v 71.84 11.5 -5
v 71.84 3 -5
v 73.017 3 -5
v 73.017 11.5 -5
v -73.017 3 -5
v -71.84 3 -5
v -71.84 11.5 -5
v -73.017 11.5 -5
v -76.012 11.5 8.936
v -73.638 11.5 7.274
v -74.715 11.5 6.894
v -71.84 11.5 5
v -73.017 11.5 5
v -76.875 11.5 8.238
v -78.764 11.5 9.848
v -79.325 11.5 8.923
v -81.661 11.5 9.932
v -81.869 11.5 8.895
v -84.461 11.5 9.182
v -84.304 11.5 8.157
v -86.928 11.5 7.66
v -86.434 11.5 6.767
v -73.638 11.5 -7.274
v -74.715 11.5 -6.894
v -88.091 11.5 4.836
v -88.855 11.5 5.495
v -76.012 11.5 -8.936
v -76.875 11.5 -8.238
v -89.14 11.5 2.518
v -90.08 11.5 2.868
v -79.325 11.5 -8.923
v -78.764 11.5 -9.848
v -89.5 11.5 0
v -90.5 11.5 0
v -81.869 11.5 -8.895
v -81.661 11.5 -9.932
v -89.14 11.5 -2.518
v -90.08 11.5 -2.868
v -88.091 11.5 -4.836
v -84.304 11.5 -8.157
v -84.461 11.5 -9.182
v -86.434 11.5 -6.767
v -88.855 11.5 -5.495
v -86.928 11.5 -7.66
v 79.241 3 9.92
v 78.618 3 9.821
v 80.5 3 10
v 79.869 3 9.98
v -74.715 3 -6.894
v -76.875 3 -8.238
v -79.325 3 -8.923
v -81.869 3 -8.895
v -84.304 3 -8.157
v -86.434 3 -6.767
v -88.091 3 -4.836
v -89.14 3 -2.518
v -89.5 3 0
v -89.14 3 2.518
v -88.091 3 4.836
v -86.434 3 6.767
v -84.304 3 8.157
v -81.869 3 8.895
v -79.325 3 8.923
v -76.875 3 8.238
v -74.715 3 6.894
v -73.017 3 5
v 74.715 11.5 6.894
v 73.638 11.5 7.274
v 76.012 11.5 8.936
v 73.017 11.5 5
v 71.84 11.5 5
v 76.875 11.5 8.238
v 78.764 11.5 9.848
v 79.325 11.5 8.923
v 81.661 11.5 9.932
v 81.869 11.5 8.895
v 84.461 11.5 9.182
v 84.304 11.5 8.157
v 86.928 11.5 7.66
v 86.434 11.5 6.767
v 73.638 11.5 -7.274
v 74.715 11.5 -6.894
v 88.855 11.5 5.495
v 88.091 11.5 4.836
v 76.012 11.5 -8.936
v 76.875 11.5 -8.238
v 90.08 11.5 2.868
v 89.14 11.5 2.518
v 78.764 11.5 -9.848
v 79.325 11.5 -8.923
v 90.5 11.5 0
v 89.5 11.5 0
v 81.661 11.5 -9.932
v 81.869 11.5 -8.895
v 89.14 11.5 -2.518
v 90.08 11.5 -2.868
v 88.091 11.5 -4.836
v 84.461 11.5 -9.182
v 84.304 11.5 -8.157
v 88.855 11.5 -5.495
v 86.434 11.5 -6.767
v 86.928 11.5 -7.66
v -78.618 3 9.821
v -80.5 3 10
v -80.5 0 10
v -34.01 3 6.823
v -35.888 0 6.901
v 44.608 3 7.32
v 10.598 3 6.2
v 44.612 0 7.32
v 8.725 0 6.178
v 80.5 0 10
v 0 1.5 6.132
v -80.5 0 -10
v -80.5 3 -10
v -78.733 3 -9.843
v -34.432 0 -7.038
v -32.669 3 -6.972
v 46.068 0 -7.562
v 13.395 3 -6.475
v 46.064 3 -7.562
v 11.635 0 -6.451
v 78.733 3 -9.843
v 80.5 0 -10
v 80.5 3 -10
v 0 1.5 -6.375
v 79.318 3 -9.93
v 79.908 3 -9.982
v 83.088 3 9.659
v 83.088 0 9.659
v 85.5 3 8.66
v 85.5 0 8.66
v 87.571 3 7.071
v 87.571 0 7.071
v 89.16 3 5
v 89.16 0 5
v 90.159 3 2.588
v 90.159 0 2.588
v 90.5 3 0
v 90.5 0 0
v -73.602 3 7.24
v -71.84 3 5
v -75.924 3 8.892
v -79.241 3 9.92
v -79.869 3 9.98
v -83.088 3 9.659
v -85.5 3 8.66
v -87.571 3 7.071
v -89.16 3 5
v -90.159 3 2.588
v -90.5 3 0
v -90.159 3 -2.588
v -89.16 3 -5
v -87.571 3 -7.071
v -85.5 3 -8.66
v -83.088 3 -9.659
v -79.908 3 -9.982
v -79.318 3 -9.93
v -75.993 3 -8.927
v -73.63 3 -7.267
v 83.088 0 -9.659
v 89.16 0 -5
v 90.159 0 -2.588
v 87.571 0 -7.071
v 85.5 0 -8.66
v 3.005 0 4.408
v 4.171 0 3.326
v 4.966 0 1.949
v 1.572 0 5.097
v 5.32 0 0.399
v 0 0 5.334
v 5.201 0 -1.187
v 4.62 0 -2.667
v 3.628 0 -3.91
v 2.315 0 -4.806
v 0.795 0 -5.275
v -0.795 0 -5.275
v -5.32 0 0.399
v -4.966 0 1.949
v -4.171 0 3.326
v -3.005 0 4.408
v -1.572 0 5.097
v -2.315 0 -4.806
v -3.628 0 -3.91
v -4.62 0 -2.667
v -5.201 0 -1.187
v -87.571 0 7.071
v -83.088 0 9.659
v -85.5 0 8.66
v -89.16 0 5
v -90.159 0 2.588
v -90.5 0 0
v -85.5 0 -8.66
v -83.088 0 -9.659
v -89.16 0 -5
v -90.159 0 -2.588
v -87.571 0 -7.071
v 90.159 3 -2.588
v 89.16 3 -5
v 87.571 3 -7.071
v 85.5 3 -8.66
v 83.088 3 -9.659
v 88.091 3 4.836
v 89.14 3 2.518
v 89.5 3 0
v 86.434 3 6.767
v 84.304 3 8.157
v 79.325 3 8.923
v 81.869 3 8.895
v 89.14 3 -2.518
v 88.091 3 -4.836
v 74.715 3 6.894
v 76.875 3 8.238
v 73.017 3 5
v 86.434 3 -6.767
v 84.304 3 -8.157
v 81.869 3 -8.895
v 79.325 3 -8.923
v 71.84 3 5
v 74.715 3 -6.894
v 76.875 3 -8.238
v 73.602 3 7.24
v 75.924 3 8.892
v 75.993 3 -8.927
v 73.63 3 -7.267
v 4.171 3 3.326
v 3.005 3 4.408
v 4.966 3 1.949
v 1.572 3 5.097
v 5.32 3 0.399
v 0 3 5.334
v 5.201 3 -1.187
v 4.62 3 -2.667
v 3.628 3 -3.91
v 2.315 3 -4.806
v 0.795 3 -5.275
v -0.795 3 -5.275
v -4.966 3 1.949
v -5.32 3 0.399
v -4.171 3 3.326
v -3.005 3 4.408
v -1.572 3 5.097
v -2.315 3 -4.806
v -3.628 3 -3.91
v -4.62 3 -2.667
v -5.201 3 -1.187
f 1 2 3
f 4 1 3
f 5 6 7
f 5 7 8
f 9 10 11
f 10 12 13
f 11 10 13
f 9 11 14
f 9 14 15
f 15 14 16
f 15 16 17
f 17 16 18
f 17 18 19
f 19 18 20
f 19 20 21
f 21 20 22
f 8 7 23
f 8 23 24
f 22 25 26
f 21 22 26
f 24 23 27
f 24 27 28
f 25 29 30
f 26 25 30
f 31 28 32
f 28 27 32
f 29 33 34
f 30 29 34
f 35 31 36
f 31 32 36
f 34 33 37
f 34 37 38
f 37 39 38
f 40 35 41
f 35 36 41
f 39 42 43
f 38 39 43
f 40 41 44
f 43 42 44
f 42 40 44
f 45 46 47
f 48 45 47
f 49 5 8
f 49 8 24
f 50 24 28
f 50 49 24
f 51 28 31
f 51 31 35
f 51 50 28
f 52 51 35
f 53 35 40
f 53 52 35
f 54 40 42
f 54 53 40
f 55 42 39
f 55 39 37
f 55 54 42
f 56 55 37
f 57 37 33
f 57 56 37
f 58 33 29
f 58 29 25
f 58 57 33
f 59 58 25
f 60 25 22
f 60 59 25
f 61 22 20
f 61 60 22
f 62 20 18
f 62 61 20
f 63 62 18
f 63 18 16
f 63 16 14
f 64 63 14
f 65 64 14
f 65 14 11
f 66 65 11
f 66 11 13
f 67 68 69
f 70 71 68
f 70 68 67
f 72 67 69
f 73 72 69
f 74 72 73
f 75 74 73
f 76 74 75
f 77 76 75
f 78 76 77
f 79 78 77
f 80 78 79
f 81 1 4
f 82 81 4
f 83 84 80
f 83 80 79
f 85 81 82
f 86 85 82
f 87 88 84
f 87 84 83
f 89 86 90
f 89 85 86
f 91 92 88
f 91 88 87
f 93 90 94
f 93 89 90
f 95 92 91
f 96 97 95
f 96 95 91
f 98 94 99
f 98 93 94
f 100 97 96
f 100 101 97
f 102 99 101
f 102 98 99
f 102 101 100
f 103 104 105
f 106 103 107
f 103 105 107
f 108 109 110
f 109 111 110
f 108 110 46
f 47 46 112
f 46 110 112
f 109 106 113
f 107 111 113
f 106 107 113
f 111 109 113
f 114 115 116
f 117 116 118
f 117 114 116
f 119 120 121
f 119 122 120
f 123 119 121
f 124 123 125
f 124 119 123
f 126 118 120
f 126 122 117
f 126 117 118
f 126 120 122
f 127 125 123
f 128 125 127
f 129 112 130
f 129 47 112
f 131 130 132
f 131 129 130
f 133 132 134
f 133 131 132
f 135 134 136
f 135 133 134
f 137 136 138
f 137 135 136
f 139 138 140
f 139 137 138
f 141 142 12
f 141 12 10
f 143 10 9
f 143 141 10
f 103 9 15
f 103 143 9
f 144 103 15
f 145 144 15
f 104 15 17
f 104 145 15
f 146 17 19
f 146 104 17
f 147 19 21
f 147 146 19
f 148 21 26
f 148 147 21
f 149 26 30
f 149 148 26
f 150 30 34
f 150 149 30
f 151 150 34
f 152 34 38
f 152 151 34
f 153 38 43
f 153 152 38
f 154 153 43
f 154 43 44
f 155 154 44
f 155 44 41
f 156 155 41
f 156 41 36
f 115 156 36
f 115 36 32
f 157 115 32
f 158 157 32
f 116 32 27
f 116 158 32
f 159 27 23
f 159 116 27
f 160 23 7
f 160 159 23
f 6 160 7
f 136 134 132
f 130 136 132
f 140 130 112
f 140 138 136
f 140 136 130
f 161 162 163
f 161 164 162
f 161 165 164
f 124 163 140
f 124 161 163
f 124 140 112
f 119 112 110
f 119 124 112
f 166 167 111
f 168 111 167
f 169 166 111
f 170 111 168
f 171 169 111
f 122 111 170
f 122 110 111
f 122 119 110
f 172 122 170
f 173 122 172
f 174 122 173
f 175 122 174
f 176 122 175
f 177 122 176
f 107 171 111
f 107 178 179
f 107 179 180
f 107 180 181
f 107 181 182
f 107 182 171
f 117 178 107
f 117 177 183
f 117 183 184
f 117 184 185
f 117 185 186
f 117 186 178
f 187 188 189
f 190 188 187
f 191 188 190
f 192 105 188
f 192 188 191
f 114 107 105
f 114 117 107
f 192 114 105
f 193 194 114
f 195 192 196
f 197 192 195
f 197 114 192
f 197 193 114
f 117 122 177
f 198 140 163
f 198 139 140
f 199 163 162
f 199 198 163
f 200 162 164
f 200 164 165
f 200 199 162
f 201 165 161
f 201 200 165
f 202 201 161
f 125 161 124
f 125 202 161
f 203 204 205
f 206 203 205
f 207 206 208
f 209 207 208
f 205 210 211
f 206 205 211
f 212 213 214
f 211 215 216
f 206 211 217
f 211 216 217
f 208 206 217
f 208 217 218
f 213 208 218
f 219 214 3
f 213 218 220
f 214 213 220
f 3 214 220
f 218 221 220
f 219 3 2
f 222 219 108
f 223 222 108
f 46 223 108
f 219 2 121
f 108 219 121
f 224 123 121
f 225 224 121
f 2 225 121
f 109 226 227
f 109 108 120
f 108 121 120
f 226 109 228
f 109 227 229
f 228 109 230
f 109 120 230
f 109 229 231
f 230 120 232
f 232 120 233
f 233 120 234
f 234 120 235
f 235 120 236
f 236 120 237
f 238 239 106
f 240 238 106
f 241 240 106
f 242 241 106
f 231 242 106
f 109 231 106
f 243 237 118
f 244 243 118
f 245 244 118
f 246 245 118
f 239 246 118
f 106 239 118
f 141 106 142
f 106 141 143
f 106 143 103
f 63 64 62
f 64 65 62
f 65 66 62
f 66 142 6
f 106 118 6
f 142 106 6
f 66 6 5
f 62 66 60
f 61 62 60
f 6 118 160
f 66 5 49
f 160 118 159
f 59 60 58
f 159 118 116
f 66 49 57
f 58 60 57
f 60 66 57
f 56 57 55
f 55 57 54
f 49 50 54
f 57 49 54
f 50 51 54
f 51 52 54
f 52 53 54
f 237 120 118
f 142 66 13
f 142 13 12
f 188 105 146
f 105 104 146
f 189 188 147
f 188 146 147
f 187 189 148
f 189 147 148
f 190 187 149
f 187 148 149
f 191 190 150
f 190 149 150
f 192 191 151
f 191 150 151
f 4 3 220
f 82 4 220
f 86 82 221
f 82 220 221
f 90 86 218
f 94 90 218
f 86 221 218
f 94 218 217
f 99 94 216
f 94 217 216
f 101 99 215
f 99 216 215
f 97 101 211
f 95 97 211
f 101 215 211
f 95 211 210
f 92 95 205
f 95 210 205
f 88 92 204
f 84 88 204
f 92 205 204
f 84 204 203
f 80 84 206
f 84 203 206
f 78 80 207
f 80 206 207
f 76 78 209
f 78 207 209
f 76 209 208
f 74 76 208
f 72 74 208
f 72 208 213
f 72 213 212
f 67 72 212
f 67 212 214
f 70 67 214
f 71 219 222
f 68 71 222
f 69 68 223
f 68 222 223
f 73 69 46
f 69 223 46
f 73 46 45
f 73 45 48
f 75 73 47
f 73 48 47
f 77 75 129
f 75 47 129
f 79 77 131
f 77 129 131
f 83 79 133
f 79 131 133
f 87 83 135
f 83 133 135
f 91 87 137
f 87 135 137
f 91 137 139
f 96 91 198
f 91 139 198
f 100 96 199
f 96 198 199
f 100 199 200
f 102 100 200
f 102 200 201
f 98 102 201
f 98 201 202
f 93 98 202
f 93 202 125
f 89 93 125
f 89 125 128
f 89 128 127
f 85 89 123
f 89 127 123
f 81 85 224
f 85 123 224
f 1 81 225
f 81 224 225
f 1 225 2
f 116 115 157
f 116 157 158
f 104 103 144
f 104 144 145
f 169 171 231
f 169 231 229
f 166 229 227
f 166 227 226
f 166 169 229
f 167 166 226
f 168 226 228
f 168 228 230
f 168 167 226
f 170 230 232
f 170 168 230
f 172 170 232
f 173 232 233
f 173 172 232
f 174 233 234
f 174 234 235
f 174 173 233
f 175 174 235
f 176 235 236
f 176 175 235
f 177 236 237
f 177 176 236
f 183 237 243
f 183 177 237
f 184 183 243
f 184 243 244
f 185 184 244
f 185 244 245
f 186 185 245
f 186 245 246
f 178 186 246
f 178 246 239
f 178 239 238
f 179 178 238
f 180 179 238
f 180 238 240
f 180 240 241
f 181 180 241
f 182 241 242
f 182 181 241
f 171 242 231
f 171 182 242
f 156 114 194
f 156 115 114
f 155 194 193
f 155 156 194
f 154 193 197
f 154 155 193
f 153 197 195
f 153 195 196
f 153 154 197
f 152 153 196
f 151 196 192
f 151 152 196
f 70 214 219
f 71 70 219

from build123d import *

# Parameters (mm, degrees)
SKETCH1_R           = 5.334493613
BOSS_EXTRUDE1_DEPTH = 3
BOSS_EXTRUDE3_DEPTH = 8.5
FILLET1_R           = 10


with BuildPart() as part:
    # Sketch1 → Boss-Extrude1 (new body)
    with BuildSketch(Plane(origin=(0, 0, 0), x_dir=(1, 0, 0), z_dir=(0, 1, 0))):
        with BuildLine():
            Line((-90.5, -10), (-90.5, 10))
            Line((-90.5, 10), (-80.5, 10))
            add(Edge.make_bspline(
                [(-80.5, 10), (0, 2.75), (80.5, 10)],
                knots=[0, 0, 0, 1, 1, 1], degree=2))
            Line((80.5, 10), (90.5, 10))
            Line((90.5, 10), (90.5, -10))
            Line((90.5, -10), (80.5, -10))
            add(Edge.make_bspline(
                [(-80.5, -10), (0, -2.264995309), (80.5, -10)],
                knots=[0, 0, 0, 1, 1, 1], degree=2))
            Line((-80.5, -10), (-90.5, -10))
        make_face()
        with Locations(Location((0, 0, 0), (0, 0, 270))):
            Circle(SKETCH1_R, mode=Mode.SUBTRACT)
    extrude(amount=BOSS_EXTRUDE1_DEPTH)

    # Sketch3 → Boss-Extrude3 (add)
    with BuildSketch(Plane(origin=(0, 3, 0), x_dir=(1, 0, 0), z_dir=(0, 1, 0))):
        with BuildLine():
            Line((71.839745962, 5), (73.016685226, 5))
            ThreePointArc((73.016685226, 5), (89.5, 0), (73.016685226, -5))
            Line((73.016685226, -5), (71.839745962, -5))
            ThreePointArc((71.839745962, -5), (90.5, 0), (71.839745962, 5))
        make_face()
        with BuildLine():
            Line((-73.016685226, -5), (-71.839745962, -5))
            ThreePointArc((-71.839745962, -5), (-90.5, 0), (-71.839745962, 5))
            Line((-71.839745962, 5), (-73.016685226, 5))
            ThreePointArc((-73.016685226, 5), (-89.5, 0), (-73.016685226, -5))
        make_face()
    extrude(amount=BOSS_EXTRUDE3_DEPTH)

    # Fillet1
    fillet1_edges = [part.edges().sort_by_distance(p)[0] for p in [
        (-90.5, 1.5, 10),
        (-90.5, 1.5, -10),
        (90.5, 1.5, -10),
        (90.5, 1.5, 10),
    ]]
    fillet(fillet1_edges, radius=FILLET1_R - 0.0001)  # a hair under: the kernel refuses the full size


solid = part.part
